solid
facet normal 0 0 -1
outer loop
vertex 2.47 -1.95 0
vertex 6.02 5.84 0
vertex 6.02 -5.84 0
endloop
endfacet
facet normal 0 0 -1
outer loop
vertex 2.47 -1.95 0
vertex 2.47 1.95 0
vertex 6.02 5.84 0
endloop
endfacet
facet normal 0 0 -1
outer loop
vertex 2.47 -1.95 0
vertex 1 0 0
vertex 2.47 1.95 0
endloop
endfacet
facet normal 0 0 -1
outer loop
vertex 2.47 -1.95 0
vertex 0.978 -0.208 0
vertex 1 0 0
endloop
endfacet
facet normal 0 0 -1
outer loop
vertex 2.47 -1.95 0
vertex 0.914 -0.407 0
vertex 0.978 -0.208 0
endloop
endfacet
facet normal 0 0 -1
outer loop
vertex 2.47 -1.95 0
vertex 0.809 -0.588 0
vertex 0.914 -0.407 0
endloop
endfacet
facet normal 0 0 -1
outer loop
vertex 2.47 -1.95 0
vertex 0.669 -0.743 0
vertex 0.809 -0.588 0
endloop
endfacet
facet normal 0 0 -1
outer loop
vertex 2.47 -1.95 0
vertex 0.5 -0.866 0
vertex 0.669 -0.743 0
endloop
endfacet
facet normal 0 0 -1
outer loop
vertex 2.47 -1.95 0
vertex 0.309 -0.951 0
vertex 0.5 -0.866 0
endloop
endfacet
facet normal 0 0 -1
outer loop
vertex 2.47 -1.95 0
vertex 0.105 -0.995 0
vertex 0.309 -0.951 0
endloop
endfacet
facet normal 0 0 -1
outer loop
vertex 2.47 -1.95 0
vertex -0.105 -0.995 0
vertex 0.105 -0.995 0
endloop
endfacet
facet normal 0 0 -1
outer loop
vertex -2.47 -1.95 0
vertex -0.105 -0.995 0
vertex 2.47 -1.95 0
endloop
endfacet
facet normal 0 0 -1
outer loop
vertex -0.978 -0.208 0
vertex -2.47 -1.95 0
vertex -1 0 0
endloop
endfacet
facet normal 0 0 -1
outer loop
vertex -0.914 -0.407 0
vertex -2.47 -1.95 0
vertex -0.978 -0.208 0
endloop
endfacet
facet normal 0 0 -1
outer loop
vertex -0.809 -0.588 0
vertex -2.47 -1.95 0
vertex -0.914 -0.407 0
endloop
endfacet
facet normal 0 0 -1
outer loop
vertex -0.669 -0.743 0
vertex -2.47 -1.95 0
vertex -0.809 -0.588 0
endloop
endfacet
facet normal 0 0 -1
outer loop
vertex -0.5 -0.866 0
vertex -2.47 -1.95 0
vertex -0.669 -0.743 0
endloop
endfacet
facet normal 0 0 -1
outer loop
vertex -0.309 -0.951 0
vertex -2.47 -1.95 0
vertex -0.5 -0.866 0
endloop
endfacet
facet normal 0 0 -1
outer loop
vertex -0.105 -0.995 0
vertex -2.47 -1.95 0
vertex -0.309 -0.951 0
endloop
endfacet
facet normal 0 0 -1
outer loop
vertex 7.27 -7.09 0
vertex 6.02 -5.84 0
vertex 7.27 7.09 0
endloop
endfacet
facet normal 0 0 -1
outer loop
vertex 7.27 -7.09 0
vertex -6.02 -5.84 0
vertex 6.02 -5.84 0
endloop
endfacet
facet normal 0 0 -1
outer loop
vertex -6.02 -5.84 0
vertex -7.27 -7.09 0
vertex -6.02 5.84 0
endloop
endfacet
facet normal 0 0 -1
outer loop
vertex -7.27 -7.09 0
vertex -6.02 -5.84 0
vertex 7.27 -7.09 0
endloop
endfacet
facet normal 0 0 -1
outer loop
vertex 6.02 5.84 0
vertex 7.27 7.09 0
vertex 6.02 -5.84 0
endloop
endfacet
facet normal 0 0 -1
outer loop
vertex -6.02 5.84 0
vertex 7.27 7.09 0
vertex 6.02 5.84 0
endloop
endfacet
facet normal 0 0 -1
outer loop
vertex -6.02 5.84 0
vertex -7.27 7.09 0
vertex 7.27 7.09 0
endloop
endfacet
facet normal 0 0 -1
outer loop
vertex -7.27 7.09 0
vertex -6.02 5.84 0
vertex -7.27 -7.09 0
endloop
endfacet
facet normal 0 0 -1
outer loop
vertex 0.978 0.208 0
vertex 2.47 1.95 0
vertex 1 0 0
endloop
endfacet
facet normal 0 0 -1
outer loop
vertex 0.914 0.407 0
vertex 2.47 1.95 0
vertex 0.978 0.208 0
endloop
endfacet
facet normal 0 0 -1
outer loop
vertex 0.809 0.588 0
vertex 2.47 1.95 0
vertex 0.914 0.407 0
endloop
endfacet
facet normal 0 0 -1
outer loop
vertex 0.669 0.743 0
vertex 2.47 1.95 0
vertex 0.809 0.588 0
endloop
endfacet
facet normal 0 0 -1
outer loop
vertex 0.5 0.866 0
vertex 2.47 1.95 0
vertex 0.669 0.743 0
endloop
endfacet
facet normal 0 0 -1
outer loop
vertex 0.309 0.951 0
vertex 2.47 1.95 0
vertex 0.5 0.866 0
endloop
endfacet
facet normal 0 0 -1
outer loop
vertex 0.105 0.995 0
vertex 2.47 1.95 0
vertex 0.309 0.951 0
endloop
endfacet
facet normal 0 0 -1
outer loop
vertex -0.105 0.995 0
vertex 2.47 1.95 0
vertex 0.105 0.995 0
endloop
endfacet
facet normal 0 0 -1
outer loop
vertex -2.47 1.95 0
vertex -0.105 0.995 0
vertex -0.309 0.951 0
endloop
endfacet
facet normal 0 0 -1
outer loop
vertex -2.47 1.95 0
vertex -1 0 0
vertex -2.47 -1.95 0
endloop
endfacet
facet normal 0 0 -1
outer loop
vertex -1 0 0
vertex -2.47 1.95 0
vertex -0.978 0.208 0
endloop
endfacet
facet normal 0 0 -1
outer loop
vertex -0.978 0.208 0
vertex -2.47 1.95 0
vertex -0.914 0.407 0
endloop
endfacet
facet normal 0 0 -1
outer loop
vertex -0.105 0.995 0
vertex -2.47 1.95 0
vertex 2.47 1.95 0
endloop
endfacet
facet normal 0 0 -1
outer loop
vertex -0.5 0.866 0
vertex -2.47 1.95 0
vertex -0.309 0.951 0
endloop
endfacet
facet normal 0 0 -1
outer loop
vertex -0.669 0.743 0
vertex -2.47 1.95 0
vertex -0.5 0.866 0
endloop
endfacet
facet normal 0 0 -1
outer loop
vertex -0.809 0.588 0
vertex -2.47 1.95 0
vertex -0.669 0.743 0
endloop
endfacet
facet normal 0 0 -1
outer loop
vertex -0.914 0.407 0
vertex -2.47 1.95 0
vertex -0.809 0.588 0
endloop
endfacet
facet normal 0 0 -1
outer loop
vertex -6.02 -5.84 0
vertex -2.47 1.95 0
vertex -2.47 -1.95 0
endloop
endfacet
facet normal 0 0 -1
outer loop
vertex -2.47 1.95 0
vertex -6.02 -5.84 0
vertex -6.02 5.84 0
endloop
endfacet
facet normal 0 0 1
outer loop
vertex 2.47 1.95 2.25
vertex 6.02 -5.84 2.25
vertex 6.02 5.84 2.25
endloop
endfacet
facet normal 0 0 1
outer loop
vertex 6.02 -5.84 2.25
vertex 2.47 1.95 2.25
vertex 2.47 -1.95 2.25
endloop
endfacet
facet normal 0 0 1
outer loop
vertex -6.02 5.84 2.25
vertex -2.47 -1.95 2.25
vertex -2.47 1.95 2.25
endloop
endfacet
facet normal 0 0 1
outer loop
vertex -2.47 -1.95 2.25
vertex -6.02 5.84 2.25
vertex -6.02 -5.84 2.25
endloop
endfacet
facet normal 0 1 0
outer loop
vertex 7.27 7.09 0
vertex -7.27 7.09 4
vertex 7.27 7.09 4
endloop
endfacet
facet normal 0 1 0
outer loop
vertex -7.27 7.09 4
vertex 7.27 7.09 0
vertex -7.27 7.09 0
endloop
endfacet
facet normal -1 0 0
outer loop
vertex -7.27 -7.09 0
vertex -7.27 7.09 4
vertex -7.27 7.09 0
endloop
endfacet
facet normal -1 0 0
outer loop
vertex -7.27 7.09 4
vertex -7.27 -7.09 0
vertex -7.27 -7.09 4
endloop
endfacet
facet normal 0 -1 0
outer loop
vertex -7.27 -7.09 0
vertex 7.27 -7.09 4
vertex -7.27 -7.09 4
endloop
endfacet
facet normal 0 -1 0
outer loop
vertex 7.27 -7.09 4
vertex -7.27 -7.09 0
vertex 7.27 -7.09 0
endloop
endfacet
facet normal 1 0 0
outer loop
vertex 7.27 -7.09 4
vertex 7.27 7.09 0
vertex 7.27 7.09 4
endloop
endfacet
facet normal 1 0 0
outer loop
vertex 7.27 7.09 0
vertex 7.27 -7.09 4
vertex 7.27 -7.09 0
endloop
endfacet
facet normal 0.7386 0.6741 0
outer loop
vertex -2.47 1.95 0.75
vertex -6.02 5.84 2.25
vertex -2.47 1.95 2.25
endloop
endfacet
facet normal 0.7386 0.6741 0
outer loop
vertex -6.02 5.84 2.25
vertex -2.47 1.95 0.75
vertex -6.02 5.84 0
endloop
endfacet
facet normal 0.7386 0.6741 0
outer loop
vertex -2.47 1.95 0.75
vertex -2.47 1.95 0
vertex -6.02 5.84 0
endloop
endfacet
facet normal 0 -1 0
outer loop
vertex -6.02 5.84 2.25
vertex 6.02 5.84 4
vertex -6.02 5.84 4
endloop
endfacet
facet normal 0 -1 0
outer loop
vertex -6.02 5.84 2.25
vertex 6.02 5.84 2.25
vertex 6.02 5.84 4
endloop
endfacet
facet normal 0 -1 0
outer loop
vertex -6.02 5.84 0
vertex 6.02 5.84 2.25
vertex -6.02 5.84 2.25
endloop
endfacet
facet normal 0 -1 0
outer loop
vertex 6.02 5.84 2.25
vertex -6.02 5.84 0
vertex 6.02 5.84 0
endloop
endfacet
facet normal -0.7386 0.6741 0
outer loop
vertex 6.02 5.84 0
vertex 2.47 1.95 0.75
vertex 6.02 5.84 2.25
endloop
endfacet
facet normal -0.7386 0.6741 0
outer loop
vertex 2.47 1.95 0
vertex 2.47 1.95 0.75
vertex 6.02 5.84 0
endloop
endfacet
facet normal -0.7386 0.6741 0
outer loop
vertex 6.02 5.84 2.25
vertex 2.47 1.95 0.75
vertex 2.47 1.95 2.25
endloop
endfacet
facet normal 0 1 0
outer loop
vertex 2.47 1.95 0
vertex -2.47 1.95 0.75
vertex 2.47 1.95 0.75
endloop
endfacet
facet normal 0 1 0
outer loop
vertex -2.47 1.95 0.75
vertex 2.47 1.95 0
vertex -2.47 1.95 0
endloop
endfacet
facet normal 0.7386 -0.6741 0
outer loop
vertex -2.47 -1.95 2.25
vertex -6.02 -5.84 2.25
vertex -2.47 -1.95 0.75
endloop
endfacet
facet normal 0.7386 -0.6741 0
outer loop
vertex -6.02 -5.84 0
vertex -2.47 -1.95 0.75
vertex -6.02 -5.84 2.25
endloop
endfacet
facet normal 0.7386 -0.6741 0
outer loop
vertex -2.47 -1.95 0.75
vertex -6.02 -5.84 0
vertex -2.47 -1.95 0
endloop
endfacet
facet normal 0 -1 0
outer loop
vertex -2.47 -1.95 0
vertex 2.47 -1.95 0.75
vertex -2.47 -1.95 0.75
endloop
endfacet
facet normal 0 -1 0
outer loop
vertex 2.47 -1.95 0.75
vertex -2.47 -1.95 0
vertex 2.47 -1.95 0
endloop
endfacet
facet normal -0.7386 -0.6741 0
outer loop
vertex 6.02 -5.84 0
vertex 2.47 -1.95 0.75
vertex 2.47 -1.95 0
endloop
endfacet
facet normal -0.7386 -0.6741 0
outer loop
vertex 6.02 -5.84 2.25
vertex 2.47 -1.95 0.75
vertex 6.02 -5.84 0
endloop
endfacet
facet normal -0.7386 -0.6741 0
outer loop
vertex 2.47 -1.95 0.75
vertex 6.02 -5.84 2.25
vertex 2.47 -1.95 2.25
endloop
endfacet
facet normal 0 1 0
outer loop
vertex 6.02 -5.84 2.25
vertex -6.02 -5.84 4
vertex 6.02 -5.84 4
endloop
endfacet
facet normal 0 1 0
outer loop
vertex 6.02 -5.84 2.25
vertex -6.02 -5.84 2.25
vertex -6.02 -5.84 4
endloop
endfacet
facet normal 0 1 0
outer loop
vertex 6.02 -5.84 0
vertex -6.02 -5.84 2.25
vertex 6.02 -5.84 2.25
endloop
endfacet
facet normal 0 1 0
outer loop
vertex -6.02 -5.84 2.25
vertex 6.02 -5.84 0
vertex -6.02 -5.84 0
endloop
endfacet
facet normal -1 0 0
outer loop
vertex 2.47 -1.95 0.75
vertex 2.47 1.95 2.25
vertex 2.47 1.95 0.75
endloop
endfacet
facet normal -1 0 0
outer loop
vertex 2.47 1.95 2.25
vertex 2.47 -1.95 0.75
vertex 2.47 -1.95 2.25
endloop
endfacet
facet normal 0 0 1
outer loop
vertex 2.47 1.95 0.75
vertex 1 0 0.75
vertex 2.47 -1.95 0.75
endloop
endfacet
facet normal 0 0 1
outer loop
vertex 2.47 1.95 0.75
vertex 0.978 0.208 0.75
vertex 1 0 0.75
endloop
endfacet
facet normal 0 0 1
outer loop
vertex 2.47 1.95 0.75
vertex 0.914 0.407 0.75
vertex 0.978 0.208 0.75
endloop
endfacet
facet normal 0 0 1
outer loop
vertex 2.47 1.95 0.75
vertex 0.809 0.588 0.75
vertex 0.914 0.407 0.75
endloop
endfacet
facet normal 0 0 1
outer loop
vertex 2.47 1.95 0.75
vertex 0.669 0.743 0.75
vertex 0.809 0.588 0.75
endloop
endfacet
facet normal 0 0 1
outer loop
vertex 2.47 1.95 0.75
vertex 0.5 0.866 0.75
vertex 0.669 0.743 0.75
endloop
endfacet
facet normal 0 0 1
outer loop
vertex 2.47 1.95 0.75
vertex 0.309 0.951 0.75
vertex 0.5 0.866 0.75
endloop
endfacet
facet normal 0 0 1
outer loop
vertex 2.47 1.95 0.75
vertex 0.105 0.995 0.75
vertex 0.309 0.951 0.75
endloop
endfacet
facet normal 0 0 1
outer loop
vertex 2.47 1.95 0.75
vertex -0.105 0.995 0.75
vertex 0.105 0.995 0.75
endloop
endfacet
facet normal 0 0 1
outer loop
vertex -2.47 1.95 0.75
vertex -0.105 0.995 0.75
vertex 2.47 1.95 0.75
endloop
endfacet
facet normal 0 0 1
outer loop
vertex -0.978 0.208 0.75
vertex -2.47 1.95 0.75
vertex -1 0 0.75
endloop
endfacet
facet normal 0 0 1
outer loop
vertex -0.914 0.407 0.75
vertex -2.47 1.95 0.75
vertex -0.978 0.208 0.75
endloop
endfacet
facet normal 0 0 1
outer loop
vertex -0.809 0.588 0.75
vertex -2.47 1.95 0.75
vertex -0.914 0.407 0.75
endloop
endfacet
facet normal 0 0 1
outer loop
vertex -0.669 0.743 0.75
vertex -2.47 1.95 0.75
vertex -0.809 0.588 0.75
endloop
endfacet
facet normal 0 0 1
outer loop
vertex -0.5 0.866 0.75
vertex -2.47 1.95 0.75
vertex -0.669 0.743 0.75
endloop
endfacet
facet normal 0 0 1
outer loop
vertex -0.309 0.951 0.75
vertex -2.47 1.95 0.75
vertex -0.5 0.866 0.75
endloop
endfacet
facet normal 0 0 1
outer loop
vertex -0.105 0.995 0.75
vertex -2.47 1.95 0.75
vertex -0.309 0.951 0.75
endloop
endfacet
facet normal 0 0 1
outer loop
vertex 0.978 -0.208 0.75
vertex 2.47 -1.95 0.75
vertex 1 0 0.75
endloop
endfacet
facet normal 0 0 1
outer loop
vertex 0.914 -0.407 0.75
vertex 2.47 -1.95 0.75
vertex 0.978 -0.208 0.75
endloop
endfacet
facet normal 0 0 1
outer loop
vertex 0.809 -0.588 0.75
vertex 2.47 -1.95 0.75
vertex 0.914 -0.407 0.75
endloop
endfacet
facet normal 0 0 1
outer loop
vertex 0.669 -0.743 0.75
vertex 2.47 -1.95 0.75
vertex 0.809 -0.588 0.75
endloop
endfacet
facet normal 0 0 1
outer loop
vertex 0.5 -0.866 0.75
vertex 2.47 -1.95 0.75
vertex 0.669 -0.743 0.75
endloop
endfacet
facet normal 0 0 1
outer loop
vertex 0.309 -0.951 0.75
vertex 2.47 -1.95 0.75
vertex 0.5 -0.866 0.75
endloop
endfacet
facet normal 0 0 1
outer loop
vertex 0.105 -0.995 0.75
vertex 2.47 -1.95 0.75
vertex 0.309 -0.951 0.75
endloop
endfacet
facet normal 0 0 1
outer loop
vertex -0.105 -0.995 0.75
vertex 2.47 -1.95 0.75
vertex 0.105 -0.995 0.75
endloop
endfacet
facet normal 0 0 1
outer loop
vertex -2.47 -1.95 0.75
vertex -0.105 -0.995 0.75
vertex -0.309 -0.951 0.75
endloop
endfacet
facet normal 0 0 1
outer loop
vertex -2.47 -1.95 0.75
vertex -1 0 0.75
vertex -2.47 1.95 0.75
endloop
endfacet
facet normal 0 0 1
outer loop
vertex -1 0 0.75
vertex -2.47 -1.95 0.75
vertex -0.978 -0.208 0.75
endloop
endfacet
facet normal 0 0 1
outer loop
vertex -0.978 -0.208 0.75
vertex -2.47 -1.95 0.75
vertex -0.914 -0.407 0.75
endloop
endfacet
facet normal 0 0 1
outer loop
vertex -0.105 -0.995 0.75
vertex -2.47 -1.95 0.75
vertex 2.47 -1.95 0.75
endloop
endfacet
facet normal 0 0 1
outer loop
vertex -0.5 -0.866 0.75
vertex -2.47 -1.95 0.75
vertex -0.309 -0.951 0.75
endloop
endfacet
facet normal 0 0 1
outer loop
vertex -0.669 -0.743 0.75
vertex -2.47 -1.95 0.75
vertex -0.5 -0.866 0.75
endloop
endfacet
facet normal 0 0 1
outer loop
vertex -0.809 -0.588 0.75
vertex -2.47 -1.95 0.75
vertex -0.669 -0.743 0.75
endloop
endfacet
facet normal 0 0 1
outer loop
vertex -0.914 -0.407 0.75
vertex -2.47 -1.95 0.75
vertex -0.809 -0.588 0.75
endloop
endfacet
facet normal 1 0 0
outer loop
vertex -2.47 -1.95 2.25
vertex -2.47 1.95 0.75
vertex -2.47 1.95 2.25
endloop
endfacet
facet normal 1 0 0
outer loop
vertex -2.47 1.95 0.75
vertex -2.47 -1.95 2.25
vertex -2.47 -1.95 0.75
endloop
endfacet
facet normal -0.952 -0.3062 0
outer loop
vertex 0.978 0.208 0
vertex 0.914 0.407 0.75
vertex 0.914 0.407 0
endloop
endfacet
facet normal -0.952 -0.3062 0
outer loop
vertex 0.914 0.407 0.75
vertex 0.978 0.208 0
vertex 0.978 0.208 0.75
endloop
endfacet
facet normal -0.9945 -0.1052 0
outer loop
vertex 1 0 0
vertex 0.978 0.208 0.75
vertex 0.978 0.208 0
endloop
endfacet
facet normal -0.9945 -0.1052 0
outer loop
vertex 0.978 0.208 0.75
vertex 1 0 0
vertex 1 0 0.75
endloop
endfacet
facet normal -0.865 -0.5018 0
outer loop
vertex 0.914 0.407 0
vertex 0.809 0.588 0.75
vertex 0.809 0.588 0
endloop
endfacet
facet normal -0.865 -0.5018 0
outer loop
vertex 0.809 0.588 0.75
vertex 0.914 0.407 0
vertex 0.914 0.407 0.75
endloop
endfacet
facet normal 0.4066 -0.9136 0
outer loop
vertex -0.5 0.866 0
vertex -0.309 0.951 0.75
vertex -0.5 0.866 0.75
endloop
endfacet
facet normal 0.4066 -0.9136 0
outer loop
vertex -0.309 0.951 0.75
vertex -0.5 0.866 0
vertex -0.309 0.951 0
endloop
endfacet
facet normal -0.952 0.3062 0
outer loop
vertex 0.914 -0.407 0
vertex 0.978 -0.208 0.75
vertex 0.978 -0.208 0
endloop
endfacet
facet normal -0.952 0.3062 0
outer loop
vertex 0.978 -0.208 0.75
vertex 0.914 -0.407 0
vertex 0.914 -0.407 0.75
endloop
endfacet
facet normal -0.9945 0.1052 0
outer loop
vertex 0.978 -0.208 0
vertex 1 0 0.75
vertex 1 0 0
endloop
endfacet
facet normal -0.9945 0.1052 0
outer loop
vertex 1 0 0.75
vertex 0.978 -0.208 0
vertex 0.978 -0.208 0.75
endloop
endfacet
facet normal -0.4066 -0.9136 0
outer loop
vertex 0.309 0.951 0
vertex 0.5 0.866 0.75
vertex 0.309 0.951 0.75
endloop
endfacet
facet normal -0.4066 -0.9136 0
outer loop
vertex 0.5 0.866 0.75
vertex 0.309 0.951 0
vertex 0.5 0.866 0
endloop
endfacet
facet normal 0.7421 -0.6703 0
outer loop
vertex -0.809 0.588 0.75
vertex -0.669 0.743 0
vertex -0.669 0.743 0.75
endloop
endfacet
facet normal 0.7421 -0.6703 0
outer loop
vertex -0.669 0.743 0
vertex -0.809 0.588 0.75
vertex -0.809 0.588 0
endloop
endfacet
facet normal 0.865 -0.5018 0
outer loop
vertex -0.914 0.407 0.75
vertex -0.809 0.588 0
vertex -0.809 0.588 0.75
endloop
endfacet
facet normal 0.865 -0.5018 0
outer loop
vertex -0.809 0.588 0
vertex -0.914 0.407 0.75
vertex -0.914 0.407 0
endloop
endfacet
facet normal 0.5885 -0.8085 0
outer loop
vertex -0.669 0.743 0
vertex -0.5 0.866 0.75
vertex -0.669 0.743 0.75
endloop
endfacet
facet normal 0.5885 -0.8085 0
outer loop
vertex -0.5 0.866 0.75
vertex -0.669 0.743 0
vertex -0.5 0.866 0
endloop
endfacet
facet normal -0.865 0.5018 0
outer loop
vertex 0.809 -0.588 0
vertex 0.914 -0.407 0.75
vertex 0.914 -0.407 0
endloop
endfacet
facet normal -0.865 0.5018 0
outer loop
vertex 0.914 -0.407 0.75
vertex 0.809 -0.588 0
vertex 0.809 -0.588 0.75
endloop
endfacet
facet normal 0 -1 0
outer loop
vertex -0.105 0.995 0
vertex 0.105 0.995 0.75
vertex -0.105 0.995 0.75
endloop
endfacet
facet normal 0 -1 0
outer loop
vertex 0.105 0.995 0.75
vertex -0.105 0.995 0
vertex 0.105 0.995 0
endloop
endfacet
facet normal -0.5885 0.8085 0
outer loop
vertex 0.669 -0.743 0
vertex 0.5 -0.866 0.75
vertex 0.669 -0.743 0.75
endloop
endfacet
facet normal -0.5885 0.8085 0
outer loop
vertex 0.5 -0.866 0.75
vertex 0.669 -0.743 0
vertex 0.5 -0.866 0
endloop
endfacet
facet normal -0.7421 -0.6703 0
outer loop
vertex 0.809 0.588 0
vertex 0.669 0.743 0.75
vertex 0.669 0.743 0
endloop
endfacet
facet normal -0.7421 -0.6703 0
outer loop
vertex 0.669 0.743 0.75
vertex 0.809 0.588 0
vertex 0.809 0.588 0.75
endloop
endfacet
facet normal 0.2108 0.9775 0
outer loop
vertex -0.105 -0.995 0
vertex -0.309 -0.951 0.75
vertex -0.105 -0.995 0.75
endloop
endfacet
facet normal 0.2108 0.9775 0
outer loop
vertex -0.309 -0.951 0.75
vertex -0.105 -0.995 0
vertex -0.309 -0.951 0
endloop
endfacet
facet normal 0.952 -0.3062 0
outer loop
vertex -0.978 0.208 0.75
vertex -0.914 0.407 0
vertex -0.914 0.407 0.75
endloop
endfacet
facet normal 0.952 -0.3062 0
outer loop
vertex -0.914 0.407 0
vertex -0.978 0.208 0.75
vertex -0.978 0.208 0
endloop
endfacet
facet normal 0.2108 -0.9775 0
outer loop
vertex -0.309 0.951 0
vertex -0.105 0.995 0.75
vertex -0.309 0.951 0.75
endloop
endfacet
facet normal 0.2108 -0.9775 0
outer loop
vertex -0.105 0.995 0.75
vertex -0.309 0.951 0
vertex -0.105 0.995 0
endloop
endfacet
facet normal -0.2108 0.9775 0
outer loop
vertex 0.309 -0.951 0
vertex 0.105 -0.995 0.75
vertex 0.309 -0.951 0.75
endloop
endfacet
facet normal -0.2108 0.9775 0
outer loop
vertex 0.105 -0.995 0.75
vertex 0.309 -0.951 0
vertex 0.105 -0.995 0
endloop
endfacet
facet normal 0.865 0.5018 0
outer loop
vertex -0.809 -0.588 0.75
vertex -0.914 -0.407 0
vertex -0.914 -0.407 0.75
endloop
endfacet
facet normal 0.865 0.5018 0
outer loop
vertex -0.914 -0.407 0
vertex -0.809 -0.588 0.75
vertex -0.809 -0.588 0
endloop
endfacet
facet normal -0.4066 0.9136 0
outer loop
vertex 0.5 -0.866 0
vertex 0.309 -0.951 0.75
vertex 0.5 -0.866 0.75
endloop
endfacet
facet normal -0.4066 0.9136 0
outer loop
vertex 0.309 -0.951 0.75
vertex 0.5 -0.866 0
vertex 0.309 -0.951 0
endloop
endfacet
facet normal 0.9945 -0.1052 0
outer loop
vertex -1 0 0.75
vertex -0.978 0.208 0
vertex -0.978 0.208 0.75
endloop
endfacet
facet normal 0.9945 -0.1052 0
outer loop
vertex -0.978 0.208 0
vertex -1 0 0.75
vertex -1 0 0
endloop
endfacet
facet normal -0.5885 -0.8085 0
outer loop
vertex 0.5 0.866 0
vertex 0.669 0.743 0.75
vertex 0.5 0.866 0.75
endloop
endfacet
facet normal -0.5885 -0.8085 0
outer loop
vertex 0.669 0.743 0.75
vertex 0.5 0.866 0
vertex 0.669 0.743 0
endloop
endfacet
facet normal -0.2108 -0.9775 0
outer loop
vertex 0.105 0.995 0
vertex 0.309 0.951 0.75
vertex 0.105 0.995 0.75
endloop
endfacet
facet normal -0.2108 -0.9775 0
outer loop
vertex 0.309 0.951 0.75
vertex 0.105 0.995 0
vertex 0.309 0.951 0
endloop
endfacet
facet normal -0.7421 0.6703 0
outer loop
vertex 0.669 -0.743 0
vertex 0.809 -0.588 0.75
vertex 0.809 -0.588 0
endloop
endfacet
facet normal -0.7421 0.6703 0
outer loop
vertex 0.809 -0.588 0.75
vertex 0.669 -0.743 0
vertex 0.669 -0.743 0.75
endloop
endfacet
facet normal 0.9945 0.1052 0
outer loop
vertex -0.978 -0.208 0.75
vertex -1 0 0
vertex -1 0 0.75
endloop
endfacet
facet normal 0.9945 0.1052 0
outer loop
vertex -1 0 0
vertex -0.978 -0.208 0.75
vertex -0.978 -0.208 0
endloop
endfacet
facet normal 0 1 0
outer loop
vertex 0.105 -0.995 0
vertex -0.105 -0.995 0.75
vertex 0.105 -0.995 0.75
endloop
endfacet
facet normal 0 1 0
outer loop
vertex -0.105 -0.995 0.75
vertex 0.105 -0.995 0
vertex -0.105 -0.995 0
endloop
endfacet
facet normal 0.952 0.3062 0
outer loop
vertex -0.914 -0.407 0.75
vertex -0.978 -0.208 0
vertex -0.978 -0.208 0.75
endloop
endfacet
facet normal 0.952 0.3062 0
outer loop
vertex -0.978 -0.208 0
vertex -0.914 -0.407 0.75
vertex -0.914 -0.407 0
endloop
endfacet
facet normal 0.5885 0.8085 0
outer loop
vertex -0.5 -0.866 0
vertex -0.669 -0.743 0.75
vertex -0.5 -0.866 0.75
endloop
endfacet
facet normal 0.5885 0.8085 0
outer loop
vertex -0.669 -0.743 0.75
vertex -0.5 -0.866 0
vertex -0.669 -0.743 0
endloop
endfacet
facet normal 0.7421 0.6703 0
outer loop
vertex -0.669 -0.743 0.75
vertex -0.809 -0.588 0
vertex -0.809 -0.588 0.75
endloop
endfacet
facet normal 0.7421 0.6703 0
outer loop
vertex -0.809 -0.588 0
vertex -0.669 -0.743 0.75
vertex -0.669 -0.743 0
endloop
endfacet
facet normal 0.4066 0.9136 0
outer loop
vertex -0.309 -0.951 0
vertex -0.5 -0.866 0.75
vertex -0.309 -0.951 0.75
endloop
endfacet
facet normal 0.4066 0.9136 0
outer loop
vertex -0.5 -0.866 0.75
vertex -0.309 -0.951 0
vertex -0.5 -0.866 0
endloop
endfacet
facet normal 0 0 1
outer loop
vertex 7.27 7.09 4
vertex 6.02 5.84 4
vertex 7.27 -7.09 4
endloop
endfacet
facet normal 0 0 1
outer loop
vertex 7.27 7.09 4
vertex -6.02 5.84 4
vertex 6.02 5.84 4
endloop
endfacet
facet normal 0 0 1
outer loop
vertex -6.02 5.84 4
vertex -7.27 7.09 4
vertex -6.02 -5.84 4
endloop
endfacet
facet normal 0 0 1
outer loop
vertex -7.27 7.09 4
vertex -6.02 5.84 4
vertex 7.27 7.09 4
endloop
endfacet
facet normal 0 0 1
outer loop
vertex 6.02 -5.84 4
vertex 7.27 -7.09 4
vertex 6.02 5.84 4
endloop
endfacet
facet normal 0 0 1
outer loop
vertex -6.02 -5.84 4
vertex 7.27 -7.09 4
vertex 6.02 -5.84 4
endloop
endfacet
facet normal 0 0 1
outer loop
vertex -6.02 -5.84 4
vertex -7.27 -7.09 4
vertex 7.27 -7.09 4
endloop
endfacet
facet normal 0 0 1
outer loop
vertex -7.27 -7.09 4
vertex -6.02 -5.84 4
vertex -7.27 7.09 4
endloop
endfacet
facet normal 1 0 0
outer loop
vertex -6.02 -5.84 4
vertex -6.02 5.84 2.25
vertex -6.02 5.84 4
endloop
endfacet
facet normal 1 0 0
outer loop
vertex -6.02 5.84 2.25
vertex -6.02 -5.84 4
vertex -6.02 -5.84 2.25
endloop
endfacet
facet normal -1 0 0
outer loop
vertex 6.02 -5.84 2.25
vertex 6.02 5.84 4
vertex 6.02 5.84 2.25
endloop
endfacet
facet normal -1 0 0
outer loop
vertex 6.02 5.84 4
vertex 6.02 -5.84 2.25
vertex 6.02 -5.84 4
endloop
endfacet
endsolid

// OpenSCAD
pcbSizeX = 11.94;
pcbSizeY = 11.58;
icSizeX = 4.9; 
icSizeY = 3.9;
icHeight = 1.5;
hole = 2;

wall = 1.25;
baseThickness = 0.75;
snapLength = 4;
wallHeight = 1.75;

pcbTolerance = 0.05;
icTolerance = 0.02;

module dummy() {}

icSizeX1 = icSizeX + 2*icTolerance;
icSizeY1 = icSizeY; // + 2*tolerance;
pcbSizeX1 = pcbSizeX + 2*pcbTolerance;
pcbSizeY1 = pcbSizeY + 2*pcbTolerance;
nudge = 0.01;

module mirrored() {
    children();
    rotate([0,0,180]) children();
}

module base() {
    module side() {
        polygon([[-pcbSizeX1/2,-pcbSizeY1/2],
                 [-icSizeX1/2,-icSizeY/2],
                 [icSizeX1/2,-icSizeY/2],
                 [pcbSizeX1/2,-pcbSizeY1/2]]);
            }
     
    
    difference() {
        union() {
            linear_extrude(height=baseThickness+icHeight)       
                difference() {
                    square([pcbSizeX1+2*wall,pcbSizeY1+2*wall],center=true);
                    mirrored() side(); 
                }
            
        }
        translate([-icSizeX1/2,-icSizeY/2-nudge,baseThickness]) 
            cube([icSizeX1,icSizeY+2*nudge,icHeight+nudge]);
        translate([0,0,-1]) cylinder(h=baseThickness+icHeight+2,d=hole,$fn=30);
    }
}

module edge() {
    difference() {
        square([pcbSizeX1+2*wall,pcbSizeY1+2*wall],center=true);
        square([pcbSizeX1,pcbSizeY1],center=true);
    }
}

base();
linear_extrude(height=wallHeight+baseThickness+icHeight) edge();
